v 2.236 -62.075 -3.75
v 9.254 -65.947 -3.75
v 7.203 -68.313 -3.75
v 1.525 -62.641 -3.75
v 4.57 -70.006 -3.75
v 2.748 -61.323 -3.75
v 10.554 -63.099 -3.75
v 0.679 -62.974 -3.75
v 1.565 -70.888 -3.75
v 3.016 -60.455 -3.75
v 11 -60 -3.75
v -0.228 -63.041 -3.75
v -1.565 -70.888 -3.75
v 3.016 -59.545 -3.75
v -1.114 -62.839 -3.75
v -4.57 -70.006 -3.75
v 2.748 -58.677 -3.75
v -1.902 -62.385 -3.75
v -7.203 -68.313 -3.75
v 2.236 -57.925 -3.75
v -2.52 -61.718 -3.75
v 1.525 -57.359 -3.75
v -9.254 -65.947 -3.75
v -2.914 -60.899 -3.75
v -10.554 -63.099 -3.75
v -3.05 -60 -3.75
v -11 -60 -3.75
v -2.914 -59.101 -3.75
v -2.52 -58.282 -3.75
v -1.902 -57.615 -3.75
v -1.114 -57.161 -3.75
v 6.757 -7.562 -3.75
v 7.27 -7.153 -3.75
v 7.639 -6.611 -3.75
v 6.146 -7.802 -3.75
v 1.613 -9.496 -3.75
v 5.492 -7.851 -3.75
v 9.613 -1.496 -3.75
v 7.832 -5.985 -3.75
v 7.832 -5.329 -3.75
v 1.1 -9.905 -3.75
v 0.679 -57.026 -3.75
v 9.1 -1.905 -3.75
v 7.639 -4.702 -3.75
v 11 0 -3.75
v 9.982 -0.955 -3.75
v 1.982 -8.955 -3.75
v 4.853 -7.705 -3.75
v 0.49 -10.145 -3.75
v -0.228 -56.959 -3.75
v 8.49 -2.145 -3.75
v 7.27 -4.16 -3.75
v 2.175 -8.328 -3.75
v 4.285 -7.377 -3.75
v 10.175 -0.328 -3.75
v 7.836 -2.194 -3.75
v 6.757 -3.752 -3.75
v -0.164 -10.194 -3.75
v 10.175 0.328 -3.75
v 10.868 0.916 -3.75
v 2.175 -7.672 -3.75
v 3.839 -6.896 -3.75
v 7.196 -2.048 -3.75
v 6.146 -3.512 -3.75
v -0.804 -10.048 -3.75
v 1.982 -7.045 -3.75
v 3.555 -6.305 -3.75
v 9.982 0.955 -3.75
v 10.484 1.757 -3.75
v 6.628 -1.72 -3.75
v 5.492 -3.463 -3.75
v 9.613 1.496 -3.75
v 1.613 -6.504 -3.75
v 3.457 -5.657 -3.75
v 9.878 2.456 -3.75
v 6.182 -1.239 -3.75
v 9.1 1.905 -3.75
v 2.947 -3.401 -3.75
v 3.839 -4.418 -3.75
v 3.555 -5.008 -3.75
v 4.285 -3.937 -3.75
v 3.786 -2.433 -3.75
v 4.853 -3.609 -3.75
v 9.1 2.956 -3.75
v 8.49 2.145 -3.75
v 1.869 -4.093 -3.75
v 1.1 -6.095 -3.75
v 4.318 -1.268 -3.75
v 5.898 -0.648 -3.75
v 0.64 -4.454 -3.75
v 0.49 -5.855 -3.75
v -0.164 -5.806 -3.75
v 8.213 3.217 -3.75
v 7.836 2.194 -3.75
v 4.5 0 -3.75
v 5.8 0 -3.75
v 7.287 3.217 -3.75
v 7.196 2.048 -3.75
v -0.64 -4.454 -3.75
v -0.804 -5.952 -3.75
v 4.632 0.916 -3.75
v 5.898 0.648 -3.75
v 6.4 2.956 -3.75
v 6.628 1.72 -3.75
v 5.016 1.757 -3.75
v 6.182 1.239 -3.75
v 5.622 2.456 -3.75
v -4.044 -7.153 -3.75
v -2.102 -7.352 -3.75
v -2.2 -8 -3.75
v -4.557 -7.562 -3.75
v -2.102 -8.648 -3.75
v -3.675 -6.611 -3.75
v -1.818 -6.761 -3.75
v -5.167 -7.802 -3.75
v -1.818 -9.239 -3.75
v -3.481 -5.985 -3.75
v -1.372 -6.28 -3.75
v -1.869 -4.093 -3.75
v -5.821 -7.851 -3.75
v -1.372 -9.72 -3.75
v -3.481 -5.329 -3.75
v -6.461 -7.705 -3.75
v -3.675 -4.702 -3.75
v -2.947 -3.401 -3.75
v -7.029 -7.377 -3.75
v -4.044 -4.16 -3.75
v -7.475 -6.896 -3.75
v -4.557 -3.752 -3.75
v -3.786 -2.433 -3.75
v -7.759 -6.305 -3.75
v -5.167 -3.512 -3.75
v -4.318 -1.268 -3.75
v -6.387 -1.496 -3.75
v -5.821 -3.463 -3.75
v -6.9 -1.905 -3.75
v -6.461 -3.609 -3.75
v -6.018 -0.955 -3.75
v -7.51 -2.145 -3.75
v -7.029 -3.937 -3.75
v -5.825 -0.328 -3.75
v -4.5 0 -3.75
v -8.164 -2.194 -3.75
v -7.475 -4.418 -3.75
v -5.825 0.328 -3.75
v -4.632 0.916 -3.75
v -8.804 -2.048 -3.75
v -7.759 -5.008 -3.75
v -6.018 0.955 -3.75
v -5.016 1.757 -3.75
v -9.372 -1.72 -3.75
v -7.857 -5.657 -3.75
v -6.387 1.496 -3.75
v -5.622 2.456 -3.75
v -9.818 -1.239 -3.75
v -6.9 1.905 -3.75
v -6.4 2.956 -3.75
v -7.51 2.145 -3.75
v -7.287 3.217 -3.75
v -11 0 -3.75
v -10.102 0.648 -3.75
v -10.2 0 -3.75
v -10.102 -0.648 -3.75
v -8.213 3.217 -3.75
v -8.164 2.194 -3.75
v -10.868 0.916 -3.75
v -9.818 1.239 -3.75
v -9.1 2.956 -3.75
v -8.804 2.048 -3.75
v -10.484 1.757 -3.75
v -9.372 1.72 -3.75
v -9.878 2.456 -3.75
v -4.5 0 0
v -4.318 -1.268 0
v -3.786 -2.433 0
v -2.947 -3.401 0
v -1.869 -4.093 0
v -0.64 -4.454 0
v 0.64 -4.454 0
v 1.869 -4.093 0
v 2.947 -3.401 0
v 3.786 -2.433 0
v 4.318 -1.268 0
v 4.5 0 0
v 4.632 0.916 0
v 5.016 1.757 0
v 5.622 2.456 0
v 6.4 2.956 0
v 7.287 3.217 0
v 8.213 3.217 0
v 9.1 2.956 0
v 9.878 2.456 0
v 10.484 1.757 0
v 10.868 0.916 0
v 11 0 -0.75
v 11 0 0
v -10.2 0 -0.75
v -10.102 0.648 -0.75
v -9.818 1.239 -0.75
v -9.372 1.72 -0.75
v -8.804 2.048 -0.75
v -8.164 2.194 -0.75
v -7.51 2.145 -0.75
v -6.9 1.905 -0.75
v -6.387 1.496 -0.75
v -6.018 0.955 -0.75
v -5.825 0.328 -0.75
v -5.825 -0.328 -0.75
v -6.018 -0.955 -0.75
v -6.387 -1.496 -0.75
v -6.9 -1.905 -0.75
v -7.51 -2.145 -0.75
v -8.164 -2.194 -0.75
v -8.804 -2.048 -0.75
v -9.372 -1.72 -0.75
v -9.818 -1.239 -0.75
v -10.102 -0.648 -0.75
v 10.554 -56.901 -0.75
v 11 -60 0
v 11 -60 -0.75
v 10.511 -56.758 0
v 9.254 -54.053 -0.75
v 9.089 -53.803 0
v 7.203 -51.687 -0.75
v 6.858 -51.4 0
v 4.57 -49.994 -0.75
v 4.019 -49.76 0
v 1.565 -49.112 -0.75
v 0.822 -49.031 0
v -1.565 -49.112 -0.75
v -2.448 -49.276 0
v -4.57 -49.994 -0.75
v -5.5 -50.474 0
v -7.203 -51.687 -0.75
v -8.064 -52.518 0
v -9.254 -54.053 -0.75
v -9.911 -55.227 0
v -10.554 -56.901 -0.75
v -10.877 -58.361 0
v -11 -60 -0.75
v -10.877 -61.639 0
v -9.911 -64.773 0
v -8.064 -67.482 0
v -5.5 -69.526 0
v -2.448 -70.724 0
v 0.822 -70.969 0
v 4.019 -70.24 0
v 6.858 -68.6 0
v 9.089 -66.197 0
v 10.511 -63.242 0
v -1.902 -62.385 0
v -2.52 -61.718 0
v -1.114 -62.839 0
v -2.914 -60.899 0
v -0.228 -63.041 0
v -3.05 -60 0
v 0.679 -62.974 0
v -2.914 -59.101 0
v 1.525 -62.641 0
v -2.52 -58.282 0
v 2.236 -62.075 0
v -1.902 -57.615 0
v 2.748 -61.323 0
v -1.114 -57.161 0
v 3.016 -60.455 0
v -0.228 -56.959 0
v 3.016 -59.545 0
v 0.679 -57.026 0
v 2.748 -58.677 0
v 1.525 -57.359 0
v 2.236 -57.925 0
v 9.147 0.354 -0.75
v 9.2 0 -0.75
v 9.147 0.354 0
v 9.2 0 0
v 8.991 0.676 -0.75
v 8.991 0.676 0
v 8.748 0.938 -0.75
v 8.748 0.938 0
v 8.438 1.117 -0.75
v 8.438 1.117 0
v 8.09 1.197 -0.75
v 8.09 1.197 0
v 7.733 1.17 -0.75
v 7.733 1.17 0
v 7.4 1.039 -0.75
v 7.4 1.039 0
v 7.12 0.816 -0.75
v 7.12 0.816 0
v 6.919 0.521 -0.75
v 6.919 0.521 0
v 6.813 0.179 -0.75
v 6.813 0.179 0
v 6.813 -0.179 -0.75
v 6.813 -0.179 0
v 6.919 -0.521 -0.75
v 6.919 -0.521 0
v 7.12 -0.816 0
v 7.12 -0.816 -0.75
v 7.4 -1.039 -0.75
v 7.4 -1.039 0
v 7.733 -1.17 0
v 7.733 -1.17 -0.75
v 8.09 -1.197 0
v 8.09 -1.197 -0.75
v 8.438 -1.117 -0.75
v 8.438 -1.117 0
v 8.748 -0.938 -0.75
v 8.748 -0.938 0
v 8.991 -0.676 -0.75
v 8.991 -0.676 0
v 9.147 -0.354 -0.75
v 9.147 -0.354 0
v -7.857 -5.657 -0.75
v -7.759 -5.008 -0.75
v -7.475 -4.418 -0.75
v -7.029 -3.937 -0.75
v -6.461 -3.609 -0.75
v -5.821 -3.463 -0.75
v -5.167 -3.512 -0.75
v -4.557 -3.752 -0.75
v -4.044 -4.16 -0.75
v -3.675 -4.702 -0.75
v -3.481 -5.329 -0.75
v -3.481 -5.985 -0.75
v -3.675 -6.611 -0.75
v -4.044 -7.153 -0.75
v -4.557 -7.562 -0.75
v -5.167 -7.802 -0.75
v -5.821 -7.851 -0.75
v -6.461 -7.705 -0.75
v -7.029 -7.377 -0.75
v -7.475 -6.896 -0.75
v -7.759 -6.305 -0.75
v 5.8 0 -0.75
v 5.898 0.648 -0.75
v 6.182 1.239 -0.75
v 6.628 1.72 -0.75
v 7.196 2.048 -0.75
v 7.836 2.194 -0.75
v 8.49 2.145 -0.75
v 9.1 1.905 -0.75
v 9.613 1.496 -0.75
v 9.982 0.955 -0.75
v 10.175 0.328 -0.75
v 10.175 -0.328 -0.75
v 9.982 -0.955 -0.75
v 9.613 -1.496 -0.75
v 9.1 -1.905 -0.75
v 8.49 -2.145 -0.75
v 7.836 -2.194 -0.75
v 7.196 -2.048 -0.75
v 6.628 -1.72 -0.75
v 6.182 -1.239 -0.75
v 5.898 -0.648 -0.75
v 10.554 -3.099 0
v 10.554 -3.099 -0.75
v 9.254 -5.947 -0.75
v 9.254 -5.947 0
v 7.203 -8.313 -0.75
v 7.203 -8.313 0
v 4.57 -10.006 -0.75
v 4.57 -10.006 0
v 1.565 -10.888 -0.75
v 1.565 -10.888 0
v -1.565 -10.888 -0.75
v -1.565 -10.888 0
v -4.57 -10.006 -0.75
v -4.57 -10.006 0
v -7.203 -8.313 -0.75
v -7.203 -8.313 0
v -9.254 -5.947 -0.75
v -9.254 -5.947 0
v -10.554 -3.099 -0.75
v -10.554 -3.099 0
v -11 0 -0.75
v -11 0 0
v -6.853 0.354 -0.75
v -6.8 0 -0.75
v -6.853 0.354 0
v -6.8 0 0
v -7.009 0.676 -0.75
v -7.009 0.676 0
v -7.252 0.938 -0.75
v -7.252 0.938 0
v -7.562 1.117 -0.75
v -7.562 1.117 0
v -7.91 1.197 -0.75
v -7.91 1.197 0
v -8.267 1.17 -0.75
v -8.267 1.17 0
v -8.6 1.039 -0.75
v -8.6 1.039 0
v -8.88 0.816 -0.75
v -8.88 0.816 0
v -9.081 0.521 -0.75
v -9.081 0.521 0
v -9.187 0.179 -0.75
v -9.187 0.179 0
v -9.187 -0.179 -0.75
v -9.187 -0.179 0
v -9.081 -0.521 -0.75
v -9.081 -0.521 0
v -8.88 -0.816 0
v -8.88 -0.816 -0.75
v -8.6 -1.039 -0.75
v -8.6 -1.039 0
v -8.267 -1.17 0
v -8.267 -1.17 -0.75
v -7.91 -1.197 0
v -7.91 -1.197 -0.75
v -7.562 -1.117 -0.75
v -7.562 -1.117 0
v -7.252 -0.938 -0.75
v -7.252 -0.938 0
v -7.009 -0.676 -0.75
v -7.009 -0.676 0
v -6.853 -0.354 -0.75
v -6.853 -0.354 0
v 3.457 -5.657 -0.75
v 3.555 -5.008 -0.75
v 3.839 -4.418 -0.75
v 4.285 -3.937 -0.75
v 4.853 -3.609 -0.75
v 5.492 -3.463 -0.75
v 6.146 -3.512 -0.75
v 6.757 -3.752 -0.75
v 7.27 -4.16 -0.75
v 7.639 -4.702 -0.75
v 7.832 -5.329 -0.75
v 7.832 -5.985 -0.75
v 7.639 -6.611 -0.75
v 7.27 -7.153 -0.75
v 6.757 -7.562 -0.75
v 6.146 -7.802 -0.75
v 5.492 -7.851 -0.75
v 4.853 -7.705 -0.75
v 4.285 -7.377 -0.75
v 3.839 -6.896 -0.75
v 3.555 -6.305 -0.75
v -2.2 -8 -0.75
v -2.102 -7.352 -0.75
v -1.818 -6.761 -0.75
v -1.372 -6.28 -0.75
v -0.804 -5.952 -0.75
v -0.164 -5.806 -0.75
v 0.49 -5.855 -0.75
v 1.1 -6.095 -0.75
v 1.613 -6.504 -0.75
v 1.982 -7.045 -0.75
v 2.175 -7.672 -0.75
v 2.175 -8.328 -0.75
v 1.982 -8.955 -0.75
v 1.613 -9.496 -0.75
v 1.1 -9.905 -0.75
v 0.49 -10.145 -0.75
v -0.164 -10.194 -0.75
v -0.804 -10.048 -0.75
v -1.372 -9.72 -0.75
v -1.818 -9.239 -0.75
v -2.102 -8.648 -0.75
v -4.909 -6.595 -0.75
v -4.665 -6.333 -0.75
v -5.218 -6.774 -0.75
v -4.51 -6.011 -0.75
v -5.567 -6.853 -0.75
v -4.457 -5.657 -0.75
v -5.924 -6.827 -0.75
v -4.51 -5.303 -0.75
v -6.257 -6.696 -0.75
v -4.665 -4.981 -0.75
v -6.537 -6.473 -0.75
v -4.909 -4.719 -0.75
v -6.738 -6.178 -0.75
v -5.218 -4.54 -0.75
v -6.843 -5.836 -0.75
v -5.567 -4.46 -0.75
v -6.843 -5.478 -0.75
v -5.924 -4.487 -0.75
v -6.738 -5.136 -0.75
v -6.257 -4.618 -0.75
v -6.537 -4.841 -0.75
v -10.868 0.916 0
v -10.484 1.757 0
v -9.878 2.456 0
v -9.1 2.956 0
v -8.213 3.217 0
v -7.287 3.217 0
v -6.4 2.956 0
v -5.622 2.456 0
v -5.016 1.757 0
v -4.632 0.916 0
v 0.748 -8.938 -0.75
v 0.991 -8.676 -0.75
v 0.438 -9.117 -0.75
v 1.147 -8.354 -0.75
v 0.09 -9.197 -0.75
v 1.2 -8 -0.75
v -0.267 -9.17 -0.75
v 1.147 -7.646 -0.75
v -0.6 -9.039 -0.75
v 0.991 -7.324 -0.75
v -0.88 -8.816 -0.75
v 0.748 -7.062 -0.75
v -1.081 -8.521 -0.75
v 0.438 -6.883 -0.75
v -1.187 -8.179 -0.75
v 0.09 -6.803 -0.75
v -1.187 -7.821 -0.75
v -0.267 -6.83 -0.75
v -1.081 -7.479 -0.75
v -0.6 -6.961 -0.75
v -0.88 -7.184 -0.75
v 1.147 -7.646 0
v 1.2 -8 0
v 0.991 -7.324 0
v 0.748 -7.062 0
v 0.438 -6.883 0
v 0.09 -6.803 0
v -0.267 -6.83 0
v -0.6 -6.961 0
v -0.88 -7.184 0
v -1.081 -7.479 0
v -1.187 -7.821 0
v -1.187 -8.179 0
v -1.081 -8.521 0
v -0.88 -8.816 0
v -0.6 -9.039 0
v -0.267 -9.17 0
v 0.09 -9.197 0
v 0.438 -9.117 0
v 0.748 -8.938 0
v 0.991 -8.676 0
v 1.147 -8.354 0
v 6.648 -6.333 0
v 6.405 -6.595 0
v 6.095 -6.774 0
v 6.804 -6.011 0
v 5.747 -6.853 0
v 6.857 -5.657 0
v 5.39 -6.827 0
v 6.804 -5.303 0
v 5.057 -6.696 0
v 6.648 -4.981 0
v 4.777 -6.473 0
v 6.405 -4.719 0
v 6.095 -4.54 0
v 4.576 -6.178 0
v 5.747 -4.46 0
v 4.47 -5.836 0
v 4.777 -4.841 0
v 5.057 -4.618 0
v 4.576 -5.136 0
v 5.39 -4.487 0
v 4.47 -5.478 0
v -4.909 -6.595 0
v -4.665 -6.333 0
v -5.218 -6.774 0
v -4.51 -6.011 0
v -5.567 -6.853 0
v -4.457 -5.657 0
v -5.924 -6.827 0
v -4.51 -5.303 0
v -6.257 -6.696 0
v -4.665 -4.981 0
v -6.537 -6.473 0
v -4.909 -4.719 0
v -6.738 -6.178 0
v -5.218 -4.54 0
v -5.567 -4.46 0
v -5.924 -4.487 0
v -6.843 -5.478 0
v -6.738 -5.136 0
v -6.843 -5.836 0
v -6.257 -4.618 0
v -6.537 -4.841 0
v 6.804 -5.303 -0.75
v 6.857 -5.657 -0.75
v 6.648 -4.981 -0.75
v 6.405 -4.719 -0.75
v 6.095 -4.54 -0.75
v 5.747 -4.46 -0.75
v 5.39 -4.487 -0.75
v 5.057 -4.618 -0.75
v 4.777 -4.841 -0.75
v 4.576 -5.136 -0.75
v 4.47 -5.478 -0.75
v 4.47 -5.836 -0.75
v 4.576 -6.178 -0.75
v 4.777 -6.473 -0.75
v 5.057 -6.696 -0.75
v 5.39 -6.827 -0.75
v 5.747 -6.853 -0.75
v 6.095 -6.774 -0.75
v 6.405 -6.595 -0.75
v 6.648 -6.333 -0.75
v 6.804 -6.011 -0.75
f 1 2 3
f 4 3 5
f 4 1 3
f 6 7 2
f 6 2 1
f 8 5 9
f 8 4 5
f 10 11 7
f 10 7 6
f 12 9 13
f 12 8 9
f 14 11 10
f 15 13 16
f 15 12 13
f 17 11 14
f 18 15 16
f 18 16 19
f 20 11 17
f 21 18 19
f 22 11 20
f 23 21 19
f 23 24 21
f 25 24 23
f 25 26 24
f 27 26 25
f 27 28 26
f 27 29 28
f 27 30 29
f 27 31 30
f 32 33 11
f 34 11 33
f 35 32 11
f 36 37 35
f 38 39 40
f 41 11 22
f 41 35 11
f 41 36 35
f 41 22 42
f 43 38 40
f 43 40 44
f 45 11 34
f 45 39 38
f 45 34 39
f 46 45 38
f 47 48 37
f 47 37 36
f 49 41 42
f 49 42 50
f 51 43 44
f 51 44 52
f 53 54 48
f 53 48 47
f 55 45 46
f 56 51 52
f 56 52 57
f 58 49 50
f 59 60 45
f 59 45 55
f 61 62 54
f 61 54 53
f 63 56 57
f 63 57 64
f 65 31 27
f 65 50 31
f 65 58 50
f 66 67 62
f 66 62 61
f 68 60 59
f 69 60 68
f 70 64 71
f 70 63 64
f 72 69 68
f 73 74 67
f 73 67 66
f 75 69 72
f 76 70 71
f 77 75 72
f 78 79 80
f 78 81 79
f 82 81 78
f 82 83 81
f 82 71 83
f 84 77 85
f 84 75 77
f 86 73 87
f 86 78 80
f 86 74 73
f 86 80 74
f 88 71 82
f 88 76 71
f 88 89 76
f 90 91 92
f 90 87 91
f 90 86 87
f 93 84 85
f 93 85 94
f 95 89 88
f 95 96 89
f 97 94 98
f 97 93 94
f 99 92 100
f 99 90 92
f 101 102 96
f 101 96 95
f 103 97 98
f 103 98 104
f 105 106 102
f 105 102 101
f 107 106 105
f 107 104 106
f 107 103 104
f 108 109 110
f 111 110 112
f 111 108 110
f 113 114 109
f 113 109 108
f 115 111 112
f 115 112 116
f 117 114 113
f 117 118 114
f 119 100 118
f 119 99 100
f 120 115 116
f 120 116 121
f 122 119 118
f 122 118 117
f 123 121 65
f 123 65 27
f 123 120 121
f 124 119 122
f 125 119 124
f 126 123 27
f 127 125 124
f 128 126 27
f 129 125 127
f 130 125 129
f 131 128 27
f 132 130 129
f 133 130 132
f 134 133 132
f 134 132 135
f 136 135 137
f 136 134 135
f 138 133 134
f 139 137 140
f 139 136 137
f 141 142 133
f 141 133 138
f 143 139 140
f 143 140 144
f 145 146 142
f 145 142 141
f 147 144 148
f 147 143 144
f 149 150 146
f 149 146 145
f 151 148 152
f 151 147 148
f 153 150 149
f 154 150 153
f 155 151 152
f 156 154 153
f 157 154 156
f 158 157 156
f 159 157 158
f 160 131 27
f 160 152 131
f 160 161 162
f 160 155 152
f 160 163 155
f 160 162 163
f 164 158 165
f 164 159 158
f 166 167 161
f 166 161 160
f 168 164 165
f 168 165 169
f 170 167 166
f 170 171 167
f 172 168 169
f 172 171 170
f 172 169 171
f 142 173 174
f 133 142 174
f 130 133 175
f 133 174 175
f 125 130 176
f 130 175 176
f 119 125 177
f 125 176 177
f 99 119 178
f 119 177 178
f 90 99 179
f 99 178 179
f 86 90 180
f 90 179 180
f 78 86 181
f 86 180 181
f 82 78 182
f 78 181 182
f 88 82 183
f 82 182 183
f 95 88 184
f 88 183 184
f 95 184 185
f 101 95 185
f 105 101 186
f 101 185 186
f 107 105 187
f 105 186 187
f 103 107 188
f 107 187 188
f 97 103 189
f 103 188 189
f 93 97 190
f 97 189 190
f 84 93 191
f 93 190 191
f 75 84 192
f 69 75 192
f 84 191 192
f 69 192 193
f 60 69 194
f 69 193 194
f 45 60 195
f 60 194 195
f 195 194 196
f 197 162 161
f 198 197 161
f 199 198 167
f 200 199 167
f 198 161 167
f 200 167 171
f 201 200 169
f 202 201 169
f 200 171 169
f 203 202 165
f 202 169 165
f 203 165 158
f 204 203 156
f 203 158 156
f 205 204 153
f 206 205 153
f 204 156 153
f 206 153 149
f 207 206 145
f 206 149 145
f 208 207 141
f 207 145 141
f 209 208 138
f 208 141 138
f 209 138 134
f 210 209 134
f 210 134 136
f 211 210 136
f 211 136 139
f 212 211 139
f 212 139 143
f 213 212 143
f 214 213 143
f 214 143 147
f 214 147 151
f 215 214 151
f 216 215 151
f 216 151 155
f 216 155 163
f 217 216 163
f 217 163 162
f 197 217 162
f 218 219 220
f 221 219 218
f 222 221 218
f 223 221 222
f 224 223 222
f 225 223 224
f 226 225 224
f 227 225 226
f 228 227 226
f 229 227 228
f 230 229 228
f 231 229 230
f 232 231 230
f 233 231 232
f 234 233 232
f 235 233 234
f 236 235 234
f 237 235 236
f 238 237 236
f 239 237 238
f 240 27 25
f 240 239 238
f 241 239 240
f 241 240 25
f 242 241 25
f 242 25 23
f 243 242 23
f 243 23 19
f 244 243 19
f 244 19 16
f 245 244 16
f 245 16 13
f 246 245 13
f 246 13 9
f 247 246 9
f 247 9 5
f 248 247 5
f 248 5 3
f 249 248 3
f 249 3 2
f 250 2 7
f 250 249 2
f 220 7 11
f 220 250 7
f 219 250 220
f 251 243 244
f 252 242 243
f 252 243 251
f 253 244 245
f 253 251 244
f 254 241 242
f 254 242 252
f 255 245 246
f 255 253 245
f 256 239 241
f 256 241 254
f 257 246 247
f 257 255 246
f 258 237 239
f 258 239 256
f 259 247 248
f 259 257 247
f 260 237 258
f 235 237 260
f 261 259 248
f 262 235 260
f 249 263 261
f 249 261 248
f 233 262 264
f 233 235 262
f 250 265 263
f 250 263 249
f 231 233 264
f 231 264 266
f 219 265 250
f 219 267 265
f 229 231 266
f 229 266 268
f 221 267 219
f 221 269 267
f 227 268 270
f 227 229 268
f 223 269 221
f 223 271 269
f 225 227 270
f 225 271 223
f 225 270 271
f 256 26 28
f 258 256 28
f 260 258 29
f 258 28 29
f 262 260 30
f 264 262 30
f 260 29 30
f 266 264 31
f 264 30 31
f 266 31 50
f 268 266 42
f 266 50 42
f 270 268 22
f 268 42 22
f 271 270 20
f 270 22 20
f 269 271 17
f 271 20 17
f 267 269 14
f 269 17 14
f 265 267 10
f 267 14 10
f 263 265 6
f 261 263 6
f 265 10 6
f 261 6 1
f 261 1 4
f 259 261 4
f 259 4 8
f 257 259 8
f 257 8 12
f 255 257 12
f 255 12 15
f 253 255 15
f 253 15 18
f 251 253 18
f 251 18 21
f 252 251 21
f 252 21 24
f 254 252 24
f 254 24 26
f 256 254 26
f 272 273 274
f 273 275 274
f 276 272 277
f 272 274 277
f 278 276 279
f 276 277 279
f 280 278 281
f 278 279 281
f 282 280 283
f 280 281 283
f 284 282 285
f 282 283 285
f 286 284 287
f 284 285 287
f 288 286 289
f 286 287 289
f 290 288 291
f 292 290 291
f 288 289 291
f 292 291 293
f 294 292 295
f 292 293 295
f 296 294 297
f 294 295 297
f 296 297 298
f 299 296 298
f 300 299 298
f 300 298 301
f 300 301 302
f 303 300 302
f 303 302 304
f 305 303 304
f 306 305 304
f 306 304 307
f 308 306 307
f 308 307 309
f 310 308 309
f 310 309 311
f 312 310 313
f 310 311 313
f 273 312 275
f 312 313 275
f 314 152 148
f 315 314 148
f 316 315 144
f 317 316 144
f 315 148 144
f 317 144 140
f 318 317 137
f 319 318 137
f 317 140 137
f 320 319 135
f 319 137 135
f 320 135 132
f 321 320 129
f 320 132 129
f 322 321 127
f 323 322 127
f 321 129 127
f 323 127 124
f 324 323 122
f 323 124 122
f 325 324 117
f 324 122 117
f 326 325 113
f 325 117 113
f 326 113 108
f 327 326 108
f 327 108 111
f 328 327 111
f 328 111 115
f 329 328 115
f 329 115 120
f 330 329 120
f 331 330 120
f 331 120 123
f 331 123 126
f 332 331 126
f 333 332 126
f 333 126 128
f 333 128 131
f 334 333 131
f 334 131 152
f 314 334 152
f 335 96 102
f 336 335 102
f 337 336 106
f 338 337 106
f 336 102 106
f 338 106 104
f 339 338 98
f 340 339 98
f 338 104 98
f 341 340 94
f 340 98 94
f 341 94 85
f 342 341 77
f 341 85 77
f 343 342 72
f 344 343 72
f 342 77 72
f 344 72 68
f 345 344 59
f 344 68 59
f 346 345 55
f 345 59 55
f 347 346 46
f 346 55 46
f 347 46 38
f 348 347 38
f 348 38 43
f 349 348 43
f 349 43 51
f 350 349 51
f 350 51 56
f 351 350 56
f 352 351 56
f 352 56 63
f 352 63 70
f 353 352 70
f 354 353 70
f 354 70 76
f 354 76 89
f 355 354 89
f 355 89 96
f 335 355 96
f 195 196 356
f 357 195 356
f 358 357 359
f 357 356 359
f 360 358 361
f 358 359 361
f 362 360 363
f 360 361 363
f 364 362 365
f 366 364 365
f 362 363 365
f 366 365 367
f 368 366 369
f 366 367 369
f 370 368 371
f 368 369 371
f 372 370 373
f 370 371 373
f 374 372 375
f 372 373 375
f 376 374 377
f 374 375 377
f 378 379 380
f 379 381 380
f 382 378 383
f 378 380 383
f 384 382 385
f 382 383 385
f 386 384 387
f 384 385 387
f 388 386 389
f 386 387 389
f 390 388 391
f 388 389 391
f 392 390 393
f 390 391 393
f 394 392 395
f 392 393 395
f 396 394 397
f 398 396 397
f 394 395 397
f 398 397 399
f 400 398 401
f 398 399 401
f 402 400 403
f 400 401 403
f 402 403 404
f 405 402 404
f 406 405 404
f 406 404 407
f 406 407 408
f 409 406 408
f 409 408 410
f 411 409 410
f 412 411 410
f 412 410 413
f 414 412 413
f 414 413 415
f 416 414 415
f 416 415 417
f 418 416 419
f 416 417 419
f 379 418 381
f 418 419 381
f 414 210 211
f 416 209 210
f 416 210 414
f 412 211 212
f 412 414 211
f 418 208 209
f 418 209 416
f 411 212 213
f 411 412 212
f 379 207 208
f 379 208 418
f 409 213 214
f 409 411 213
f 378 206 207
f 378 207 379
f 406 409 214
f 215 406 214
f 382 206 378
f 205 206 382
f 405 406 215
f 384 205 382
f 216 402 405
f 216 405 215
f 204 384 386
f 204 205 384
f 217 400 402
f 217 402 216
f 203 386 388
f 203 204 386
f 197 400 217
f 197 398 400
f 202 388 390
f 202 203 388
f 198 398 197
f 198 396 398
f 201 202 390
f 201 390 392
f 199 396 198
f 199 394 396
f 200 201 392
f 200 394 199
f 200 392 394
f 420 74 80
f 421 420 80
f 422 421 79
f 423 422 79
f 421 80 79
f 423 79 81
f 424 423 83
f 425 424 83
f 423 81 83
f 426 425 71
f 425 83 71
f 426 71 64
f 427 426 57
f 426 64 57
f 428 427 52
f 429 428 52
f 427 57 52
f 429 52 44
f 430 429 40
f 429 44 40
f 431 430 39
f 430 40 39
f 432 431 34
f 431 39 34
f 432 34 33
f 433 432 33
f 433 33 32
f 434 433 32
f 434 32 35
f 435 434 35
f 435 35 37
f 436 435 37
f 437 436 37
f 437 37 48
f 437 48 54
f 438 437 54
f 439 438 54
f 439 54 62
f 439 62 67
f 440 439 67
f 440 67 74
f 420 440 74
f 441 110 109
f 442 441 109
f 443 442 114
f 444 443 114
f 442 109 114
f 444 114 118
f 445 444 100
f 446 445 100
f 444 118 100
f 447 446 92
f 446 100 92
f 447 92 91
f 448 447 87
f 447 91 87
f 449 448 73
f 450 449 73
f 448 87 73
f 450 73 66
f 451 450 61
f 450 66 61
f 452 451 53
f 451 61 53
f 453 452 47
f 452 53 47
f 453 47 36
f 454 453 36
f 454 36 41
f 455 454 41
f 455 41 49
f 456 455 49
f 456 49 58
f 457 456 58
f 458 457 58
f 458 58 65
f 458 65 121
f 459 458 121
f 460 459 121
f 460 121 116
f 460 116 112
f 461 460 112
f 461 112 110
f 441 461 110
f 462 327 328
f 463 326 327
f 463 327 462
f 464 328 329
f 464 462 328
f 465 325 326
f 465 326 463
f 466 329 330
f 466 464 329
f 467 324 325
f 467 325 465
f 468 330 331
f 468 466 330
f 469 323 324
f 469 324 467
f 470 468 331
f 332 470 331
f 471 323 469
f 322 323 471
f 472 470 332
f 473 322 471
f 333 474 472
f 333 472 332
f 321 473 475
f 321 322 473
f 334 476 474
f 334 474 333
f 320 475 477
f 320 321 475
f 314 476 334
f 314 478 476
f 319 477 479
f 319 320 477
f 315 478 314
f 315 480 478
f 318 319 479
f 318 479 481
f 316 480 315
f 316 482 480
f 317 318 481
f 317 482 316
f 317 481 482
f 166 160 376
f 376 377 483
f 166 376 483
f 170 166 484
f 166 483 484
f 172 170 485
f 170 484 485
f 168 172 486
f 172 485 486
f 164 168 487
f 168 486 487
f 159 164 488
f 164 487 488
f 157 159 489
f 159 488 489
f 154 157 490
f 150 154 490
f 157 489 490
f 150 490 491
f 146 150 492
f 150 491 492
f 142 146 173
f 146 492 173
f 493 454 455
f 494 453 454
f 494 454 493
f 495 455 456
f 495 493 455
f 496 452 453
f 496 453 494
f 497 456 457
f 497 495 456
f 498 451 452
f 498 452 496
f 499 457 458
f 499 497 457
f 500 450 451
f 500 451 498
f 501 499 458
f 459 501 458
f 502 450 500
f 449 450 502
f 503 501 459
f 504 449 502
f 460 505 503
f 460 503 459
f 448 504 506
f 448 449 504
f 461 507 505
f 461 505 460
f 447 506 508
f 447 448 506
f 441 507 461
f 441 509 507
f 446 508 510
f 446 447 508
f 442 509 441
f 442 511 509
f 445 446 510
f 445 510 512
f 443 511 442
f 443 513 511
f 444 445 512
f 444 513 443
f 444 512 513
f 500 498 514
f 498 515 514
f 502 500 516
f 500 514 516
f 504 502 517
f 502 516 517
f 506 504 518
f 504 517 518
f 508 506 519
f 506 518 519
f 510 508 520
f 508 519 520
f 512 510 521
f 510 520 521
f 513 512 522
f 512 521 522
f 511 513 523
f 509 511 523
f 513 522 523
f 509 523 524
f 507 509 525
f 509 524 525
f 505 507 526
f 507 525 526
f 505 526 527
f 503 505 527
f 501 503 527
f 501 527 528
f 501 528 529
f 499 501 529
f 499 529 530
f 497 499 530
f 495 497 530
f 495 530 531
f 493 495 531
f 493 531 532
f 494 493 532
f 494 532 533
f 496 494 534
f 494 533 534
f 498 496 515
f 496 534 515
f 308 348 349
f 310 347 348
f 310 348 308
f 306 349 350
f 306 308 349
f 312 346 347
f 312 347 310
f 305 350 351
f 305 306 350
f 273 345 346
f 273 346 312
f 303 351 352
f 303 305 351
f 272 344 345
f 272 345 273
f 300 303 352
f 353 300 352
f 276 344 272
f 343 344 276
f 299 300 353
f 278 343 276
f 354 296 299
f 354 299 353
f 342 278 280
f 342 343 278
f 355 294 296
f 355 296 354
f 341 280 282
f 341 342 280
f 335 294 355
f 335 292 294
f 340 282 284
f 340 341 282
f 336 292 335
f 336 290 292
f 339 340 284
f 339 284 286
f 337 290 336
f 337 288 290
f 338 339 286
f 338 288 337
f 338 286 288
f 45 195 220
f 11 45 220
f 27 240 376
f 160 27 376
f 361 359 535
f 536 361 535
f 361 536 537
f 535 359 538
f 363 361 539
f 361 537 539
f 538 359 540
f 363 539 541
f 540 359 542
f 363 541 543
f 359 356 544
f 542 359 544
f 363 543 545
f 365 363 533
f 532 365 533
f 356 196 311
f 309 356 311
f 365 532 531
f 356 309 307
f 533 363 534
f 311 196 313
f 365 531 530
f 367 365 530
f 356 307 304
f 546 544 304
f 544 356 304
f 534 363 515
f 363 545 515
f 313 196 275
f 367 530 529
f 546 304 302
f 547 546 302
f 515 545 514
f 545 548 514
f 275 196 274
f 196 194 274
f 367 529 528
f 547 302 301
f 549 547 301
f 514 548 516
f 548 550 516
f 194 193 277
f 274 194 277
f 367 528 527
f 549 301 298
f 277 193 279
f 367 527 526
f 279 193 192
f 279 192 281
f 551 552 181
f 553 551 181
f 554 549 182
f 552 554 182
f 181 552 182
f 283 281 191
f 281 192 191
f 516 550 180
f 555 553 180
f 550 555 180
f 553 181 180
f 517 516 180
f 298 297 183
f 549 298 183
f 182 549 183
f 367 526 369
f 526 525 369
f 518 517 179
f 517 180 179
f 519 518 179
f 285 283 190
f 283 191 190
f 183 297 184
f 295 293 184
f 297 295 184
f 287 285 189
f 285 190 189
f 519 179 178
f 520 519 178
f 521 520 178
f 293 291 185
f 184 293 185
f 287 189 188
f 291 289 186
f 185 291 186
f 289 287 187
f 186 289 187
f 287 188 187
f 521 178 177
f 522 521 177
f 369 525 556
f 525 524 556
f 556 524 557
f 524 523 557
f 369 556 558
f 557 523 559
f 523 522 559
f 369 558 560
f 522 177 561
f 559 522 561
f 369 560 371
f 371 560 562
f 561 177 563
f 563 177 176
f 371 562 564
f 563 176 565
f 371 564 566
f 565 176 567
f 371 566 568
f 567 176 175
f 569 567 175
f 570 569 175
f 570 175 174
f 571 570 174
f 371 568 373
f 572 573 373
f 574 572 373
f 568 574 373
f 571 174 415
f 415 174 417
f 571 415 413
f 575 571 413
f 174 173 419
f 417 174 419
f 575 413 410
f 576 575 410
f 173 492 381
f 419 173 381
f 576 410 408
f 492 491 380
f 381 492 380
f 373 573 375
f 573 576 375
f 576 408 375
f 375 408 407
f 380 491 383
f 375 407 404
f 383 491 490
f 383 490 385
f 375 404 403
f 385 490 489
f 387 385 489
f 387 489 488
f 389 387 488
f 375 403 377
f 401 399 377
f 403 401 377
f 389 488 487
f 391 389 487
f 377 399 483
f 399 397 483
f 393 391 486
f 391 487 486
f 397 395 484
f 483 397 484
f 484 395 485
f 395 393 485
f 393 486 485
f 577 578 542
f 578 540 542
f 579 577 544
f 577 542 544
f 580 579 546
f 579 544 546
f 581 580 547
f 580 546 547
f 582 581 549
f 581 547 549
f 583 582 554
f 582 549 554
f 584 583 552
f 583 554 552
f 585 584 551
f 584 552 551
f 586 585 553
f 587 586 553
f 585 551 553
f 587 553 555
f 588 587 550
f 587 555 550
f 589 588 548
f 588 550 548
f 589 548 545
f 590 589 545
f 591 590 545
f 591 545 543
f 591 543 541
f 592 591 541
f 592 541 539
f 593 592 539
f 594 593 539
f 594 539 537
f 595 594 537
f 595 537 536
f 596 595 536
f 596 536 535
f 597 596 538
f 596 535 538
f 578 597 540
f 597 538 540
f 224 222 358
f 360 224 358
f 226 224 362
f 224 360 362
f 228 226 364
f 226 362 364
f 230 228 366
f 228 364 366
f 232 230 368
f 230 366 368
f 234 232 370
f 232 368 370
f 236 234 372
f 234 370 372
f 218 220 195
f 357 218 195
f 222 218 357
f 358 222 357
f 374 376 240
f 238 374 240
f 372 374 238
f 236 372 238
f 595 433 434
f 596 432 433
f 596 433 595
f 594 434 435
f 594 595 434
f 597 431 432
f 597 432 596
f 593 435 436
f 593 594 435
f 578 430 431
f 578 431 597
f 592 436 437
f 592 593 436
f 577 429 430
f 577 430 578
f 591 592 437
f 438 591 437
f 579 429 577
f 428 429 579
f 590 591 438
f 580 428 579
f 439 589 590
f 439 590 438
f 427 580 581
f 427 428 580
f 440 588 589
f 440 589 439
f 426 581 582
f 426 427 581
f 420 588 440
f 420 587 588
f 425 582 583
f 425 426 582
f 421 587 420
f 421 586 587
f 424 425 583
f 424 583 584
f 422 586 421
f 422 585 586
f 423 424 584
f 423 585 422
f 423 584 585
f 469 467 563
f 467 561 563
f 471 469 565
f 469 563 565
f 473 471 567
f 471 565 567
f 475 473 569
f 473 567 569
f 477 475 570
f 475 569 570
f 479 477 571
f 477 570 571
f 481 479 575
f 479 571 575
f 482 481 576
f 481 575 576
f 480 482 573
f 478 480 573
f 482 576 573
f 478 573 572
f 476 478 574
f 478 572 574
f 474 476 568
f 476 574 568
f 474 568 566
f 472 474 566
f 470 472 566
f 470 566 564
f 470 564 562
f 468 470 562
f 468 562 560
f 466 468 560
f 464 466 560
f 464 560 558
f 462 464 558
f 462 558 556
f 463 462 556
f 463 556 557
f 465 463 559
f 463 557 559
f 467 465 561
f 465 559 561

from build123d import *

# Parameters (mm, degrees)
RESSALTO_EXTRUS_O1_DEPTH          = 0.75
RESSALTO_EXTRUS_O2_DEPTH          = 3
REBAIXO_PARA_SHCS_M21_D           = 2.4
REBAIXO_PARA_SHCS_M21_CBORE_D     = 4.4
REBAIXO_PARA_SHCS_M21_CBORE_DEPTH = 3
RESSALTO_EXTRUS_O3_START          = 0.75
ESBO_O4_R                         = 11
RESSALTO_EXTRUS_O3_DEPTH          = 0.75
ESBO_O5_R                         = 3.05
CORTE_EXTRUS_O1_DEPTH             = 72.944857356


with BuildPart() as part:
    # Esboço1 → Ressalto-extrusão1 (new body)
    with BuildSketch(Plane.XY):
        with BuildLine():
            ThreePointArc((-4.5, 0), (0, -4.5), (4.5, 0))
            ThreePointArc((4.5, 0), (7.75, 3.25), (11, 0))
            ThreePointArc((11, 0), (0, -11), (-11, 0))
            ThreePointArc((-11, 0), (-7.75, 3.25), (-4.5, 0))
        make_face()
    extrude(amount=-RESSALTO_EXTRUS_O1_DEPTH)

    # Esboço3 → Ressalto-extrusão2 (add)
    with BuildSketch(Plane(origin=(0, 0, -0.75), x_dir=(-1, 0, 0), z_dir=(0, 0, -1))):
        with BuildLine():
            Line((-11, 0), (-11, -60))
            ThreePointArc((-11, -60), (0, -71), (11, -60))
            Line((11, -60), (11, 0))
            ThreePointArc((11, 0), (7.75, 3.25), (4.5, 0))
            ThreePointArc((4.5, 0), (0, -4.5), (-4.5, 0))
            ThreePointArc((-4.5, 0), (-7.75, 3.25), (-11, 0))
        make_face()
    extrude(amount=RESSALTO_EXTRUS_O2_DEPTH)

    # Rebaixo para SHCS M21 (through all)
    with Locations(Plane(origin=(0, 0, -3.75), x_dir=(-1, 0, 0), z_dir=(0, 0, -1))):
        with Locations((-8, 0), (-5.656854249, -5.656854249), (0, -8), (5.656854249, -5.656854249), (8, 0)):
            CounterBoreHole(REBAIXO_PARA_SHCS_M21_D / 2, REBAIXO_PARA_SHCS_M21_CBORE_D / 2, REBAIXO_PARA_SHCS_M21_CBORE_DEPTH)

    # Esboço4 → Ressalto-extrusão3 (add)
    with BuildSketch(Plane.XY.offset(-0.75).offset(RESSALTO_EXTRUS_O3_START)):
        with Locations((0, -60)):
            Circle(ESBO_O4_R)
    extrude(amount=-RESSALTO_EXTRUS_O3_DEPTH)

    # Esboço5 → Corte-extrusão1 (cut, through all)
    with BuildSketch(Plane(origin=(0, 0, -3.75), x_dir=(-1, 0, 0), z_dir=(0, 0, -1))):
        with Locations((0, -60)):
            Circle(ESBO_O5_R)
    extrude(amount=-CORTE_EXTRUS_O1_DEPTH, mode=Mode.SUBTRACT)


solid = part.part
